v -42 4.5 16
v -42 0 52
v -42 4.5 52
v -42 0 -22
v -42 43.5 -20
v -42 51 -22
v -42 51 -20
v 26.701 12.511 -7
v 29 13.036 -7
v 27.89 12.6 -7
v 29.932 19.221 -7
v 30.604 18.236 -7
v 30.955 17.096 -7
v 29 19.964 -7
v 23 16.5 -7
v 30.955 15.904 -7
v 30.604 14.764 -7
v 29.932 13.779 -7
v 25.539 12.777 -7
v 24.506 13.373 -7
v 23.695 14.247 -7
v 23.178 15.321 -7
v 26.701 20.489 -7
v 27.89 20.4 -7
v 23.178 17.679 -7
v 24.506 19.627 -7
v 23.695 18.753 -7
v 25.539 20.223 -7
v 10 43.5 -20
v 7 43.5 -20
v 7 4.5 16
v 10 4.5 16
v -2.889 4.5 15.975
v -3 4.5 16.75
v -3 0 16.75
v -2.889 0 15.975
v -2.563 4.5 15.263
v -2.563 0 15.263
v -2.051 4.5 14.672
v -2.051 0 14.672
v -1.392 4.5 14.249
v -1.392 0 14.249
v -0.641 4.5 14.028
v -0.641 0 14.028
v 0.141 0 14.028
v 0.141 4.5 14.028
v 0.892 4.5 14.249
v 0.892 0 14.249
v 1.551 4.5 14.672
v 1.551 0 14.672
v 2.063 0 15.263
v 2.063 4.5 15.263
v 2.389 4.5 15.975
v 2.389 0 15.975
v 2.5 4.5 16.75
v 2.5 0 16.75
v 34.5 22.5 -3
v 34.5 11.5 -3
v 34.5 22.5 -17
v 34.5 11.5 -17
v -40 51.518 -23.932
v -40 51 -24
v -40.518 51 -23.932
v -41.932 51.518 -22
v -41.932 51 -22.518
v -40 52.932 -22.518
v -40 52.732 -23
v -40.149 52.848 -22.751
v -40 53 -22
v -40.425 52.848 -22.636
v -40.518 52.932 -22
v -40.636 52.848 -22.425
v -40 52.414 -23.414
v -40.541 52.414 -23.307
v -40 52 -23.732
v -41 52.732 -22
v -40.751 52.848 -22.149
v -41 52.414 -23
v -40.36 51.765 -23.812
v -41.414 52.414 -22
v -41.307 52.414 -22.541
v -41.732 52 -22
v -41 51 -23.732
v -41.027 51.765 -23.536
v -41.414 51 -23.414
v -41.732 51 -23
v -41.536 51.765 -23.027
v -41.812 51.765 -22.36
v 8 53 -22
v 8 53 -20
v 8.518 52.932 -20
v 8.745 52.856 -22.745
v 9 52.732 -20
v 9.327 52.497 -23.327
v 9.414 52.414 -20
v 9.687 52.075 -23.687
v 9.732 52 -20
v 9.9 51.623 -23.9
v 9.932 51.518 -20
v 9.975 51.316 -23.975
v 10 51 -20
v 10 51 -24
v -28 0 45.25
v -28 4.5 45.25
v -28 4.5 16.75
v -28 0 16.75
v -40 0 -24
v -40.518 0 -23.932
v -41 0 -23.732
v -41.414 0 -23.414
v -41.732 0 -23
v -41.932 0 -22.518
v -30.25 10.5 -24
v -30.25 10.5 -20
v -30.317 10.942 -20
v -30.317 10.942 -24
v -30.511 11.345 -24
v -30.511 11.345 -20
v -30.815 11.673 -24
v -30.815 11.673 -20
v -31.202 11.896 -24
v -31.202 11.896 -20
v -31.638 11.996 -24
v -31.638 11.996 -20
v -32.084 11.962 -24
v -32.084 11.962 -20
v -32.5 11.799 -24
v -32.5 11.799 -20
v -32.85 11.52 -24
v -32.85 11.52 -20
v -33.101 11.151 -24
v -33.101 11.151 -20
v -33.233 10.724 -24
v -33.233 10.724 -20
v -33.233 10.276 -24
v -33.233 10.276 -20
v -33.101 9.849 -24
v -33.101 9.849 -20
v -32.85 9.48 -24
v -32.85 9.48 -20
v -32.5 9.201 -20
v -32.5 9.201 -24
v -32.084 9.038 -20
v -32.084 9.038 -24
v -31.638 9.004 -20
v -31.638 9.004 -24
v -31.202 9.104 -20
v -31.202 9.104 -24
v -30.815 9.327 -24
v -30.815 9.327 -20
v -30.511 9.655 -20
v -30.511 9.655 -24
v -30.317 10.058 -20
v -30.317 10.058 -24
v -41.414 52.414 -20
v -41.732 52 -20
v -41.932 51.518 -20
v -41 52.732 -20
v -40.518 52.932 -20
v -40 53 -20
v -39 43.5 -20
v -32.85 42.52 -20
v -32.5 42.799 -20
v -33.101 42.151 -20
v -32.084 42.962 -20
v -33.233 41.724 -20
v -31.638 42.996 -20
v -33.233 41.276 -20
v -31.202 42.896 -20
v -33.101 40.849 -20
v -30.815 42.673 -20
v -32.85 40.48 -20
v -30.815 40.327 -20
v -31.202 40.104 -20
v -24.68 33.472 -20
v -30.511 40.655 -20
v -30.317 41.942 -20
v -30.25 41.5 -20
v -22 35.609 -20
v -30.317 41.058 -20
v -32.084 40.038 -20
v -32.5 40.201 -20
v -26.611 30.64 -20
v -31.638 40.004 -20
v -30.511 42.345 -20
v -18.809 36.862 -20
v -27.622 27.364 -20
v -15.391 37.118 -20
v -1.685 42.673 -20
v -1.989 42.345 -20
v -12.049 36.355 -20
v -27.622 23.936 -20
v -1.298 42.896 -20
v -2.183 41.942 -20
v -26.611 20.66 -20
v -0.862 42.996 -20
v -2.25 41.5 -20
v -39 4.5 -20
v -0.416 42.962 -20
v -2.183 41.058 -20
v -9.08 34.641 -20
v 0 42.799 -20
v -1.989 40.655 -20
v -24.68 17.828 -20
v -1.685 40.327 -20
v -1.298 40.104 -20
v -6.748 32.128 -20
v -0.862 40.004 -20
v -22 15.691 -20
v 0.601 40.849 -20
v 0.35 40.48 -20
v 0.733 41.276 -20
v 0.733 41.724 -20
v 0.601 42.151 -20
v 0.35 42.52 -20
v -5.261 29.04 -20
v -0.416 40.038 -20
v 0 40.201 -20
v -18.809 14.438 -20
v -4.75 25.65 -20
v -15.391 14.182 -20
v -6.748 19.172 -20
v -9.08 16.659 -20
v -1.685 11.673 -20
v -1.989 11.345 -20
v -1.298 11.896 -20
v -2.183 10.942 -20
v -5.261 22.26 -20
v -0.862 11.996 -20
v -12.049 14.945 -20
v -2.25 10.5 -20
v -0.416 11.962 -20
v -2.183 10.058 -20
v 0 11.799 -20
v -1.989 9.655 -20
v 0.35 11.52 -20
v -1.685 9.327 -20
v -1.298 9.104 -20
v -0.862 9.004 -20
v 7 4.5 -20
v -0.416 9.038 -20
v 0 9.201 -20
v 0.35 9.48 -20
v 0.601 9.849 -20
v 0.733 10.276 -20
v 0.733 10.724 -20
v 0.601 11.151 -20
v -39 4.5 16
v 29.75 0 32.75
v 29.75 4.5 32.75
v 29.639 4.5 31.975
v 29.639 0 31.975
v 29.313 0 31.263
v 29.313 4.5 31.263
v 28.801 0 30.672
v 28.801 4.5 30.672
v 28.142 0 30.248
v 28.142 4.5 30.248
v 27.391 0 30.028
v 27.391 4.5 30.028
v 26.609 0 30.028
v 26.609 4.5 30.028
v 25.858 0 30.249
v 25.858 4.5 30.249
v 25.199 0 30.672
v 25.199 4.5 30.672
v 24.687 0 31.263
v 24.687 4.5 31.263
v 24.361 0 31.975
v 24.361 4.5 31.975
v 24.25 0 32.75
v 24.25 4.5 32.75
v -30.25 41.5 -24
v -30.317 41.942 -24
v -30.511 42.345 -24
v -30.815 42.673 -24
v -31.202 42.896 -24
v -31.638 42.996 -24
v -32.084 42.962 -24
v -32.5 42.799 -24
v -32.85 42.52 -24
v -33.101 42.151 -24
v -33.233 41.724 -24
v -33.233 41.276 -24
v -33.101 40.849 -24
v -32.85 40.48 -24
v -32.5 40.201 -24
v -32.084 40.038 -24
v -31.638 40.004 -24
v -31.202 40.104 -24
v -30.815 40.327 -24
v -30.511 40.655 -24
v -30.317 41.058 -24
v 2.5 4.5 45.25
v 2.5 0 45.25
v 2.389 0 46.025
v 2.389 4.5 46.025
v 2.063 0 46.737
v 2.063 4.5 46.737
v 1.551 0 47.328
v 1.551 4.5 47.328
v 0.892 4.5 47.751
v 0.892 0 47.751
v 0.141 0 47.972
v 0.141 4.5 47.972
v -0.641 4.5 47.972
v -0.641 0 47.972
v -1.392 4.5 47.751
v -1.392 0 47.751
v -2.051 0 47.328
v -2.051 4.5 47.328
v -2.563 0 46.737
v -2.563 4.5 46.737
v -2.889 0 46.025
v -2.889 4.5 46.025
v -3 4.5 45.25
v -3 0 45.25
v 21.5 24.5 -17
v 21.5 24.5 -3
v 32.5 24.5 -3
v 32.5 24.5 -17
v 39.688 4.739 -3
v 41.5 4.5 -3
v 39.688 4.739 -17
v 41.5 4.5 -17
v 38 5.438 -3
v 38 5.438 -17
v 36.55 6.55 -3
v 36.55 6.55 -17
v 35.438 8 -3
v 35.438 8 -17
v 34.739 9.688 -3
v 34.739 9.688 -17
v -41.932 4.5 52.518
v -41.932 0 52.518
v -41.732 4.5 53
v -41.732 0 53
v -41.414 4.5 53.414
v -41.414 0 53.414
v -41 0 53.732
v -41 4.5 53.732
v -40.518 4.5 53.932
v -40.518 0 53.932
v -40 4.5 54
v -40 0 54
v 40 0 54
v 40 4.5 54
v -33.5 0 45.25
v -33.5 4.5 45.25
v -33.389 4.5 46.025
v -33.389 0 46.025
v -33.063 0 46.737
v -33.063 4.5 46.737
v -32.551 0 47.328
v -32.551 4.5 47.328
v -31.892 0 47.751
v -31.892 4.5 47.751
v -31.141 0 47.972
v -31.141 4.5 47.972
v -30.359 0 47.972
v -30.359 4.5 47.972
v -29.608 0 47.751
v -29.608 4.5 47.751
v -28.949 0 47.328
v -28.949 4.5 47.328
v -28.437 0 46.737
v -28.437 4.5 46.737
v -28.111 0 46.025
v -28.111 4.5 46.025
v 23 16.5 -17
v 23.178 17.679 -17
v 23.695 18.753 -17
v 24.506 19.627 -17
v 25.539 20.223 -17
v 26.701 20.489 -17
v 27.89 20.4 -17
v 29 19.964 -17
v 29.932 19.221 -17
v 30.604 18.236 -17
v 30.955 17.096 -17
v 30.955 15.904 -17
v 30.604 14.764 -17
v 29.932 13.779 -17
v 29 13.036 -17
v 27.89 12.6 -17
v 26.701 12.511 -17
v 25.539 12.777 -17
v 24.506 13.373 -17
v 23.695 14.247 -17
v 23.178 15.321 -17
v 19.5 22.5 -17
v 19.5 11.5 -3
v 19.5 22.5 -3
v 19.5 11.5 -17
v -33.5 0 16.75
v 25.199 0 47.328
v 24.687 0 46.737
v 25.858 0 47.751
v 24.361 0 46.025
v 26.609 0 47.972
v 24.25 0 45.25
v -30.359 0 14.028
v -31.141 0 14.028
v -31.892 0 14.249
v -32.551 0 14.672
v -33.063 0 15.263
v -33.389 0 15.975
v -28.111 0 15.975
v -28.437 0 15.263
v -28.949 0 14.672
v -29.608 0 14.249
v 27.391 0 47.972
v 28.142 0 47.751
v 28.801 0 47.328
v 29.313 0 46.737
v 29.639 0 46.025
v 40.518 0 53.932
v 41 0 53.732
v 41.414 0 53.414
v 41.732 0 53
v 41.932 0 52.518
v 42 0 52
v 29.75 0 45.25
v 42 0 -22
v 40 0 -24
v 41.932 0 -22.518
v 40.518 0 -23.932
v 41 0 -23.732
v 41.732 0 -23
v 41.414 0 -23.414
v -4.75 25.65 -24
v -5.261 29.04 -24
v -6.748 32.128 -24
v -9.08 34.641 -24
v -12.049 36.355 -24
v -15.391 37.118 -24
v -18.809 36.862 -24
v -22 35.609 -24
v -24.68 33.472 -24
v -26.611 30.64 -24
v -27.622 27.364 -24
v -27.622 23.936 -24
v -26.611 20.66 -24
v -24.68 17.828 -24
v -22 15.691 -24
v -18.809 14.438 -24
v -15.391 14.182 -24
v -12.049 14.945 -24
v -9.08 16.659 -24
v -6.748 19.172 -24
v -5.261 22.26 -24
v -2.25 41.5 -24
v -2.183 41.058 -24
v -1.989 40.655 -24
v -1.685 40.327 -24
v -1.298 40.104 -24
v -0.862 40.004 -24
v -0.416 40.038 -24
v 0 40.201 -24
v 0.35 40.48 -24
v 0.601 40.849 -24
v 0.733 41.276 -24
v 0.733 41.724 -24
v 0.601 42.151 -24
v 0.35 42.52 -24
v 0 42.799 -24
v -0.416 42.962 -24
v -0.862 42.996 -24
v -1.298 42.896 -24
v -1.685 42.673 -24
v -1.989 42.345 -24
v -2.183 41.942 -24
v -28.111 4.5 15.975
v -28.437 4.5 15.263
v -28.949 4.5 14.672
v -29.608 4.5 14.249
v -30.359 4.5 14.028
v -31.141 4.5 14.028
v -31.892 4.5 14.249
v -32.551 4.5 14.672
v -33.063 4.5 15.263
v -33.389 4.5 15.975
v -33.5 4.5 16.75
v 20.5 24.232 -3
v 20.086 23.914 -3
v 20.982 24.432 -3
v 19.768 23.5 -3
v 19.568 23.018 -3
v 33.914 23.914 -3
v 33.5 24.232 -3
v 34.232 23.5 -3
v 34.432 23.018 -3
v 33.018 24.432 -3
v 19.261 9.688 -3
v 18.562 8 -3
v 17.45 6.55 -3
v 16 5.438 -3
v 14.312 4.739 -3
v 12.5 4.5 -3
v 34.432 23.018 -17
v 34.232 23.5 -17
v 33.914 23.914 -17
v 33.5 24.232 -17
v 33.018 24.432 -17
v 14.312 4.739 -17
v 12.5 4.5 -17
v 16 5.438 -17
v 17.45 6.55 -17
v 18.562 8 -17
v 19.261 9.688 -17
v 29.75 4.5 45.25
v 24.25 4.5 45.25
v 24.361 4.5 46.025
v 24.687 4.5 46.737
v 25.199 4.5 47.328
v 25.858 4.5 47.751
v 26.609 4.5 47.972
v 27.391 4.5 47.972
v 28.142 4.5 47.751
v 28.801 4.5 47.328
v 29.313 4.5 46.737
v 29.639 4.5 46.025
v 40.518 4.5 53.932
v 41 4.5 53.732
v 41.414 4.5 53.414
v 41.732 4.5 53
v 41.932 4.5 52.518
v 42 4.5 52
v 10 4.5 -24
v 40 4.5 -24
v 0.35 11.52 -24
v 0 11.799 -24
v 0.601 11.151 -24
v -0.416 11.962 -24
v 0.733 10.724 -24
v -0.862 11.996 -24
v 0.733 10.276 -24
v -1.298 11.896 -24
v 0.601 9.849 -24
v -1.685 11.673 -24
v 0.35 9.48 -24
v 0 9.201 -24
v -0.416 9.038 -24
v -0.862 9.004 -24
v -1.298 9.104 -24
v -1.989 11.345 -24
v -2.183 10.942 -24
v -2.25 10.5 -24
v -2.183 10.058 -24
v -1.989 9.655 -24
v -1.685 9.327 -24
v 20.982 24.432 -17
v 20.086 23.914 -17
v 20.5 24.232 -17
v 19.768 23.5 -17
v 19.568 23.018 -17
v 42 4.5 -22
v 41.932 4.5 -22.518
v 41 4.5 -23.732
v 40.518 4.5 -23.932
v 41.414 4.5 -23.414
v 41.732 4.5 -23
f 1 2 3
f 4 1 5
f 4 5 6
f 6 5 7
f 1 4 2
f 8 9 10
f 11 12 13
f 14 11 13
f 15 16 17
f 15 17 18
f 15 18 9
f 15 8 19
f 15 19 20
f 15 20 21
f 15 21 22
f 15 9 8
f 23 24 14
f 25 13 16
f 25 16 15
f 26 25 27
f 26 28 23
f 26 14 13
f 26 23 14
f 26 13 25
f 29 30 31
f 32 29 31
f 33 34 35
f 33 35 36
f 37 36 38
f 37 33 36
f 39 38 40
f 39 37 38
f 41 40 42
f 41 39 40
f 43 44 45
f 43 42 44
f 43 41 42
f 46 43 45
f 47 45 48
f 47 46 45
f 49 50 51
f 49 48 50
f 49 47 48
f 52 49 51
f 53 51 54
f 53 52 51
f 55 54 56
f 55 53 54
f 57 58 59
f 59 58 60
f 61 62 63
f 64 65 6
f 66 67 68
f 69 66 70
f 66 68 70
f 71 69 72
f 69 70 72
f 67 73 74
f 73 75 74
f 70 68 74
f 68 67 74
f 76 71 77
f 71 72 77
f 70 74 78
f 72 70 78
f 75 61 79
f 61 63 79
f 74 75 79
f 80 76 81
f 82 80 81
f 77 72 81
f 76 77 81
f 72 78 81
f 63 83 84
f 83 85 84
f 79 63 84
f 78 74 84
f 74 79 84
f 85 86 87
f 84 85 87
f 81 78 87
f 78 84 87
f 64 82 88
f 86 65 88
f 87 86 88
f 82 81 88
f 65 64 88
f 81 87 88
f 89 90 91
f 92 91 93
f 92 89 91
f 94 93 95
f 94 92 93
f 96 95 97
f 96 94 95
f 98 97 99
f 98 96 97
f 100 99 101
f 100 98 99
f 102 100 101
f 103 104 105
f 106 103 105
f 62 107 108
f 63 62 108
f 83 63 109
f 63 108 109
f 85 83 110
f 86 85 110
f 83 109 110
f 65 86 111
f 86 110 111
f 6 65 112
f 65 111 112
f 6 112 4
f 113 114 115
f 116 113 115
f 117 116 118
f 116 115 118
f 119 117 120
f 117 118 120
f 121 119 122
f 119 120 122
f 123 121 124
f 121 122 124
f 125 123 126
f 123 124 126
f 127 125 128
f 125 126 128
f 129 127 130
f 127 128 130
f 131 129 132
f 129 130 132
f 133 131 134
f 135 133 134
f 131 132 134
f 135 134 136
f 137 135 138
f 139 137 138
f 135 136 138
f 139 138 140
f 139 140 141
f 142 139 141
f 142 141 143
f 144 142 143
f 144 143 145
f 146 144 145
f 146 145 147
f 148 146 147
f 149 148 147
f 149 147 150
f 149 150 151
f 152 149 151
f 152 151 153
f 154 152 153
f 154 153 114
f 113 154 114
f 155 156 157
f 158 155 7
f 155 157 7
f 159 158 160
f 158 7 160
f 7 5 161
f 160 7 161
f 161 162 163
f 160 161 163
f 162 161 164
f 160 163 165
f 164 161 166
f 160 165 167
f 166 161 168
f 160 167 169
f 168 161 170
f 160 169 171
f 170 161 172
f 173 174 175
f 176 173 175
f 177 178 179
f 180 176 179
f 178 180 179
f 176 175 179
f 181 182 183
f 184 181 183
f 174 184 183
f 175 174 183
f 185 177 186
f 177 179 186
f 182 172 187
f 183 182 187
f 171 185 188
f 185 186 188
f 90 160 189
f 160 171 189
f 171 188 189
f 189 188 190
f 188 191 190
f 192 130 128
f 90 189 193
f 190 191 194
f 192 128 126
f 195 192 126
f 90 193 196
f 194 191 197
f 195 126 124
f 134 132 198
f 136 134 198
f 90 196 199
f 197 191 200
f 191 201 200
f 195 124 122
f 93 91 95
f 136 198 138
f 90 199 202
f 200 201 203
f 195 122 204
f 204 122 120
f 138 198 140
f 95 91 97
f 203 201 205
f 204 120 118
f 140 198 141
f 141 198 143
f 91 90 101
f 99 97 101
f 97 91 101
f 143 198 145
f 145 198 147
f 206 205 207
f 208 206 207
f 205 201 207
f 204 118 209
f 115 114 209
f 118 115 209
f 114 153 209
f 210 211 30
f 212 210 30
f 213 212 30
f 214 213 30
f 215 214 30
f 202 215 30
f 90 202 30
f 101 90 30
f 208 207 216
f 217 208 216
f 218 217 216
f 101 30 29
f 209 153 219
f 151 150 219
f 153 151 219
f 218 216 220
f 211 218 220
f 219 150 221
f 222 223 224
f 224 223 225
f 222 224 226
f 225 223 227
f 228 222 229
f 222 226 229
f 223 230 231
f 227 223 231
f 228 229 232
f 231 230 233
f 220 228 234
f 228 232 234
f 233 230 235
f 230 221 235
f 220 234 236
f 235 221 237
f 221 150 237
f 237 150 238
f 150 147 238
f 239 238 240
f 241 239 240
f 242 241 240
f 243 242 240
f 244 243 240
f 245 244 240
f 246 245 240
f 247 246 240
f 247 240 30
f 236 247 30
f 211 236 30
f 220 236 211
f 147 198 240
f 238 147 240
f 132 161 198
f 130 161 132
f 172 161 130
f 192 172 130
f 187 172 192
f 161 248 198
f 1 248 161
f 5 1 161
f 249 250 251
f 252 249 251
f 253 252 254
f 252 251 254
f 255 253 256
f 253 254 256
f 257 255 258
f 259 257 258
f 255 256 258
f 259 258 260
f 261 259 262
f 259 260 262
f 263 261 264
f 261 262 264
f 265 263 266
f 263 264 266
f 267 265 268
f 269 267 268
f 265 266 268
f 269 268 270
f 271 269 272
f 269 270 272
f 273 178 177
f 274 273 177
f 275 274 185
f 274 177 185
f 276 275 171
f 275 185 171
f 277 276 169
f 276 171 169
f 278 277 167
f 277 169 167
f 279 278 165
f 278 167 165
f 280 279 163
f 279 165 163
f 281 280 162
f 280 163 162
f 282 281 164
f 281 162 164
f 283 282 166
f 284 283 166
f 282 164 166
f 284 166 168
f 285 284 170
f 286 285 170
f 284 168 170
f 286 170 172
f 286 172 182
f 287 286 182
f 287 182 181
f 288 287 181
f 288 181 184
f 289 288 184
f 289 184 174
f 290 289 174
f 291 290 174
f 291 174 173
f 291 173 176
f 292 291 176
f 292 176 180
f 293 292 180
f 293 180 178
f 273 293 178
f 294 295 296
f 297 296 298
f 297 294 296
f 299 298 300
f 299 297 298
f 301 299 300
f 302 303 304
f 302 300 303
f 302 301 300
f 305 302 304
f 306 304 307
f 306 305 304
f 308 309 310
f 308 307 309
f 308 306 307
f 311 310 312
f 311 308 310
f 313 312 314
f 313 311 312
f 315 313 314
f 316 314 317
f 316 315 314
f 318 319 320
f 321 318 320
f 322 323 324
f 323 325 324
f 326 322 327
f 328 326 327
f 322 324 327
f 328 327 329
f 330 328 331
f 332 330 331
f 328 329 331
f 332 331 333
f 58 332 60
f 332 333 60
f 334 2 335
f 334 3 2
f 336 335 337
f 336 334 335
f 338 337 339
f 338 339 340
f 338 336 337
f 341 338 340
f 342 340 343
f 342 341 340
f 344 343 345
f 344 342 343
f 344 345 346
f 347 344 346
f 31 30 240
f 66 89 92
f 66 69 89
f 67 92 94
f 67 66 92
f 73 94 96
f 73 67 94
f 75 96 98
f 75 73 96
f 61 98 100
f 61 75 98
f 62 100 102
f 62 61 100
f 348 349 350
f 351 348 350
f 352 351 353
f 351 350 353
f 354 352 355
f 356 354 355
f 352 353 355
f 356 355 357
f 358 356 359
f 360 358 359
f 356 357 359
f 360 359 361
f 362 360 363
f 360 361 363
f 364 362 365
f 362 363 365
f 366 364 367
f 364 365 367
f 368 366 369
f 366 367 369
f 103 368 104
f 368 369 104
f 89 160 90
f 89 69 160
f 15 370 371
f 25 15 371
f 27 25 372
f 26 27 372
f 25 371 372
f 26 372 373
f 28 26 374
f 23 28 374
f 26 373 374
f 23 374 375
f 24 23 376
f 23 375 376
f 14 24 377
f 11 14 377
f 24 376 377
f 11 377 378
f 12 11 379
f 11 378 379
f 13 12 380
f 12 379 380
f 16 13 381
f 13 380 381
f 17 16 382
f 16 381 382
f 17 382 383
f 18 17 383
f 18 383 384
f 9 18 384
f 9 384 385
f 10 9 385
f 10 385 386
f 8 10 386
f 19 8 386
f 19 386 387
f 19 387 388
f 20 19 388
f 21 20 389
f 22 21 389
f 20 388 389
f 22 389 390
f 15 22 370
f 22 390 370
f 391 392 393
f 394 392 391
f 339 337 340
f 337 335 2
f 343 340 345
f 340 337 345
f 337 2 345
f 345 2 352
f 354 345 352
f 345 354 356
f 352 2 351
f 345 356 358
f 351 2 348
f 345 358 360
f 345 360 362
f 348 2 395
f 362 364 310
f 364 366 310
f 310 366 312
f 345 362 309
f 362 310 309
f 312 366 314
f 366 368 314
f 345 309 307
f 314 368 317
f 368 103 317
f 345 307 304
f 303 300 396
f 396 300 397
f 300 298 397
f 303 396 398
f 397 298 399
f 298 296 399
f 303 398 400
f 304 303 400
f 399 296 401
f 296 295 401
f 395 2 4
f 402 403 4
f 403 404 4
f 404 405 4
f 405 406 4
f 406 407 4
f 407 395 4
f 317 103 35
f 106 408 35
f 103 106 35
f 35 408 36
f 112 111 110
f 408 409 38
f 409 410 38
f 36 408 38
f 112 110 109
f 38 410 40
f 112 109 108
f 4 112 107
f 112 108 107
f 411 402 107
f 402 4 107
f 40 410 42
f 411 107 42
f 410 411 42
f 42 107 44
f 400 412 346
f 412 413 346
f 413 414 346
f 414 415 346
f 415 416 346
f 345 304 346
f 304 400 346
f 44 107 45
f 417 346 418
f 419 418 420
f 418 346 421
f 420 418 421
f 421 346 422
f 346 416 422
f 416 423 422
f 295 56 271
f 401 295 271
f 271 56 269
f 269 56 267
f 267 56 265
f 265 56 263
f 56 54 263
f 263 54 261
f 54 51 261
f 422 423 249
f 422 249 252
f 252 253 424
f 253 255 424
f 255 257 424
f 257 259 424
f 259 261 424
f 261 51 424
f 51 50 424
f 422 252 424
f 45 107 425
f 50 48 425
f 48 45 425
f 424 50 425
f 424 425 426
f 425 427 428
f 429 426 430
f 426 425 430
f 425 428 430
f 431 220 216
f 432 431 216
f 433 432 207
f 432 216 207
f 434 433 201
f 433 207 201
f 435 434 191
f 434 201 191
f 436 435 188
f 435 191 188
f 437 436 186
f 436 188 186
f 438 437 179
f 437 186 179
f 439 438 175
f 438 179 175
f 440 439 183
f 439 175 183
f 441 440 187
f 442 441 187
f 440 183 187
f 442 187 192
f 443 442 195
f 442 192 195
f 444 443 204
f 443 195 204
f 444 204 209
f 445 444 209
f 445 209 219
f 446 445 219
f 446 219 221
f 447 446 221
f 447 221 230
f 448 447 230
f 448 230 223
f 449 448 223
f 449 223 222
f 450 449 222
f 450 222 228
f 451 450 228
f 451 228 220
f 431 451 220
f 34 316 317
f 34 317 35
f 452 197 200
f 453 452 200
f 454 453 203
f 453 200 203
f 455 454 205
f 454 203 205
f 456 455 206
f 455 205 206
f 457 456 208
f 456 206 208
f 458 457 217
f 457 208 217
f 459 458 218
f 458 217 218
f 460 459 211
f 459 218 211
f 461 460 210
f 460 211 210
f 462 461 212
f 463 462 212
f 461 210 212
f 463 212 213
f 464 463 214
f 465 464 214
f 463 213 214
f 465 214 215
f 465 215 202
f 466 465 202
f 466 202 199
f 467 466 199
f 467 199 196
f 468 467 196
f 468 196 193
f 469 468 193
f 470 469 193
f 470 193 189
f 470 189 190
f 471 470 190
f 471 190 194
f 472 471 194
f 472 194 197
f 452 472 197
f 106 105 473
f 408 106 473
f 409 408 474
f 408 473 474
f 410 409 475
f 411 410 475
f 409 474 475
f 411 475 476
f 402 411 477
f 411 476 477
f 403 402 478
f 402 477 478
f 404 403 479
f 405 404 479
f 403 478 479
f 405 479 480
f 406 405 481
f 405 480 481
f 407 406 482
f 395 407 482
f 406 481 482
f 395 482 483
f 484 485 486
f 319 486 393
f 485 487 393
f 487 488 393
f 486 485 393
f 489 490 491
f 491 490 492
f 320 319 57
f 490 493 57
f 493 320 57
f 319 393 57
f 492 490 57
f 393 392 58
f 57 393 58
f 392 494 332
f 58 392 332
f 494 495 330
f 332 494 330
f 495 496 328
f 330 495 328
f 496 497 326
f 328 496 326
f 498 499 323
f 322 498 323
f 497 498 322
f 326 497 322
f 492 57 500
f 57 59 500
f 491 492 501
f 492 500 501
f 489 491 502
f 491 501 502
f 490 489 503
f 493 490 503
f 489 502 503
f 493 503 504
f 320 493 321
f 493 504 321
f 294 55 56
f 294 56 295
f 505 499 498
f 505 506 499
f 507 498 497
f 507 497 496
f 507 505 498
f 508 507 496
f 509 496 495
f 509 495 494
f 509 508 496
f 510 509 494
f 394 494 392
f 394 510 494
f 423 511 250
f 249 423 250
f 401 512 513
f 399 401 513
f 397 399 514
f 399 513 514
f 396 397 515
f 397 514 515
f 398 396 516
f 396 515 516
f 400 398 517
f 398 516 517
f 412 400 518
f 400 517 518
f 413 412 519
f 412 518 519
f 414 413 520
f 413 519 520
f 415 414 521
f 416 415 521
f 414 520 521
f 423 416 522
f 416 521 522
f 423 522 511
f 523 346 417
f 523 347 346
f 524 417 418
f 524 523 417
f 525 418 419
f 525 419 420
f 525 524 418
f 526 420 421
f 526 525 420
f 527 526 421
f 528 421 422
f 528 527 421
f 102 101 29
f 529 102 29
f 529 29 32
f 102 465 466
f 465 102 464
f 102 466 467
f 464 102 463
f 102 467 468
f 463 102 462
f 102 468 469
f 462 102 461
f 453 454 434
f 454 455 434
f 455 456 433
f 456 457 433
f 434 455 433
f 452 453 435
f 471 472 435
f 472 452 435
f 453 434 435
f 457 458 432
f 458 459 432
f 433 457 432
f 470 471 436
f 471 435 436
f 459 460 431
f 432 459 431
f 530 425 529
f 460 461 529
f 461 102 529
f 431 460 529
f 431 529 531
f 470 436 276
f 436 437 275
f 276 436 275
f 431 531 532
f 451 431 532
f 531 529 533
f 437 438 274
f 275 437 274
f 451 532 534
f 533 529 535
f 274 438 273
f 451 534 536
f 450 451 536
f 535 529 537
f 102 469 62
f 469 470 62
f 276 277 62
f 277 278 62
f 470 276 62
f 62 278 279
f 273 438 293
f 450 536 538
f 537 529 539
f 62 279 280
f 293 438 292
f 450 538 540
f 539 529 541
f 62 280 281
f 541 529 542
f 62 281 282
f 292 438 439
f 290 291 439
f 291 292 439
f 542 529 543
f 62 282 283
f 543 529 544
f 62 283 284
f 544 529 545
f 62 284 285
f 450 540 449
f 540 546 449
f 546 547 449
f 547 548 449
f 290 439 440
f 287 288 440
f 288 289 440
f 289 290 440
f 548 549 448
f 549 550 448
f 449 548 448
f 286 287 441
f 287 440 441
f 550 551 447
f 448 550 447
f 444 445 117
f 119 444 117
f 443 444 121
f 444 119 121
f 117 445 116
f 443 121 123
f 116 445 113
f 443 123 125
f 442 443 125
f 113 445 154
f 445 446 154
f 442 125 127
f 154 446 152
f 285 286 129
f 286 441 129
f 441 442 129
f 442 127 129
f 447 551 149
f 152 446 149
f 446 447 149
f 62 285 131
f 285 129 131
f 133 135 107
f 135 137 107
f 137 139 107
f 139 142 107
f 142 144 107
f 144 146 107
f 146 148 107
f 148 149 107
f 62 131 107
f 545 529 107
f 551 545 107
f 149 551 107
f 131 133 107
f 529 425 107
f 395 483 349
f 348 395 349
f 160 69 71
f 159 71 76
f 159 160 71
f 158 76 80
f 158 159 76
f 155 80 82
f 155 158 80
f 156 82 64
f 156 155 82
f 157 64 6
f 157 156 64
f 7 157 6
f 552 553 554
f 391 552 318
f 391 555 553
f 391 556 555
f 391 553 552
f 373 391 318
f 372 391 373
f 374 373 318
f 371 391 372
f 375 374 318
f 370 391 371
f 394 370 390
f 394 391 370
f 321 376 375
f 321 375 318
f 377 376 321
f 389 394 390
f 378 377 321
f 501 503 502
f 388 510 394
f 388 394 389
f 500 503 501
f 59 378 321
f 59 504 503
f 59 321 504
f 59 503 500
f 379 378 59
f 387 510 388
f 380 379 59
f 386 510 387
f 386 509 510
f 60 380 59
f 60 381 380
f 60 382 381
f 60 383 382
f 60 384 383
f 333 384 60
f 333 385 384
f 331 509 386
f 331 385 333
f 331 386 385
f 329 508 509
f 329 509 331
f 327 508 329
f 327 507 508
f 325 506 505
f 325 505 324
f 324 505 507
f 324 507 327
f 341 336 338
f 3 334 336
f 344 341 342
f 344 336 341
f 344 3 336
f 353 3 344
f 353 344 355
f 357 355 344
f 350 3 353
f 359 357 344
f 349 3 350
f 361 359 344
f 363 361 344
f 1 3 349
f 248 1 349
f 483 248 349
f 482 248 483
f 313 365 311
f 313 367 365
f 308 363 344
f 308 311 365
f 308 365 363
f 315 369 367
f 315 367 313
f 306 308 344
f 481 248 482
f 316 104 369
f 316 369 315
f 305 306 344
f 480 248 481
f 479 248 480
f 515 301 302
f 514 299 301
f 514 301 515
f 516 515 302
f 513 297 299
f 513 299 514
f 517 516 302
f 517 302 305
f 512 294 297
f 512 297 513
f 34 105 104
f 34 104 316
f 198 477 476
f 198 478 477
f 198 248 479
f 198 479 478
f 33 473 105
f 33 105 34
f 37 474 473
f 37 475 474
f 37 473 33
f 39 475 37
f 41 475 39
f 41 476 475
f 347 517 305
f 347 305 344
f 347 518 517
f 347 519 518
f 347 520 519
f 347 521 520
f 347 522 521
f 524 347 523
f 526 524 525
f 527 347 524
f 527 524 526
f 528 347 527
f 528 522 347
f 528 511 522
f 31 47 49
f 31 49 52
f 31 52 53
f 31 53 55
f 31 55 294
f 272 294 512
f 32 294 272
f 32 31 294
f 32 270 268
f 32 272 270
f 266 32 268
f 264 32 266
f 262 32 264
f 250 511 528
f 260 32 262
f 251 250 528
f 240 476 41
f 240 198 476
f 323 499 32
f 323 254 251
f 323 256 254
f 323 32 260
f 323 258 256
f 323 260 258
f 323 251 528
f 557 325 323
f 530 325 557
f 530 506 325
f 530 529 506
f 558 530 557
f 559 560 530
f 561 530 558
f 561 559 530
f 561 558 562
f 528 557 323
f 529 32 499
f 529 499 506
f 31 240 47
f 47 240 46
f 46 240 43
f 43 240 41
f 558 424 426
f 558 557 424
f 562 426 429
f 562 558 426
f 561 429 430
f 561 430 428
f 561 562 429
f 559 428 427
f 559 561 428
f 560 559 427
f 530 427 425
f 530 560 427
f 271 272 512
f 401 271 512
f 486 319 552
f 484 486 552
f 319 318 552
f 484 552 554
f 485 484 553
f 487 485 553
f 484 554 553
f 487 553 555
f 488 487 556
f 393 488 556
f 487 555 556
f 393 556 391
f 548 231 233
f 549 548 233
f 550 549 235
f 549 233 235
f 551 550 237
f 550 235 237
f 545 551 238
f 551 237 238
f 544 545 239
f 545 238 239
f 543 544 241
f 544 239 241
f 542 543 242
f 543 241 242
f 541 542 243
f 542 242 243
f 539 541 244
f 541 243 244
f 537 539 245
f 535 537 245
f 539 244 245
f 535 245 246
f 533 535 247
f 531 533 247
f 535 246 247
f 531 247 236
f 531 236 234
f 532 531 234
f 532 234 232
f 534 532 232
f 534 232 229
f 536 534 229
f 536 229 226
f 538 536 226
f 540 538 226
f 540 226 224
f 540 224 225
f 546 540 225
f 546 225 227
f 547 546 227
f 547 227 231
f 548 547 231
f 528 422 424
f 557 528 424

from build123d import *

# Parameters (mm, degrees)
SKETCH1_W               = 84
SKETCH1_H               = 78
BOSS_EXTRUDE1_DEPTH     = 4.5
FILLET2_R               = 2
CUT_EXTRUDE1_DEPTH      = 69.558369292
CUT_EXTRUDE1_DEPTH_BACK = 69.558369292
BOSS_EXTRUDE2_DEPTH     = 48.5
FILLET4_R               = 2
RIB7_REACH              = 115.053
SKETCH4_WALL_W          = 281.181587792
SKETCH4_WALL_H          = 3
RIB8_REACH              = 93.81
SKETCH6_WALL_W          = 238.694589152
SKETCH6_WALL_H          = 3
SKETCH7_R               = 11.5
SKETCH7_R_2             = 1.5
CUT_EXTRUDE2_DEPTH      = 101.244700608
SKETCH8_W               = 15
SKETCH8_H               = 14
BOSS_EXTRUDE3_DEPTH     = 20
FILLET5_R               = 7
FILLET6_R               = 2
SKETCH9_R               = 4
CUT_EXTRUDE3_DEPTH      = 10
CUT_EXTRUDE4_DEPTH      = 84.858511792


with BuildPart() as part:
    # Sketch1 → Boss-Extrude1 (new body)
    with BuildSketch(Plane(origin=(0, 0, 0), x_dir=(1, 0, 0), z_dir=(0, 1, 0))):
        with Locations((0, -15)):
            Rectangle(SKETCH1_W, SKETCH1_H)
    extrude(amount=BOSS_EXTRUDE1_DEPTH)

    # Fillet2
    fillet2_edges = [part.edges().sort_by_distance(p)[0] for p in [
        (-42, 2.25, -24),
        (42, 2.25, -24),
        (42, 2.25, 54),
        (-42, 2.25, 54),
    ]]
    fillet(fillet2_edges, radius=FILLET2_R)

    # Sketch2 → Cut-Extrude1 (cut, two sides)
    with BuildSketch(Plane(origin=(0, 4.5, 0), x_dir=(1, 0, 0), z_dir=(0, 1, 0))) as cut_extrude1_sk:
        with BuildLine():
            Line((-33.5, -16.749999598), (-33.5, -45.249999598))
            ThreePointArc((-33.5, -45.249999598), (-30.750000201, -48), (-28, -45.25))
            Line((-28, -45.25), (-28, -16.749999598))
            ThreePointArc((-28, -16.749999598), (-30.75, -13.999999598), (-33.5, -16.749999598))
        make_face()
        with BuildLine():
            Line((2.5, -16.749999598), (2.5, -45.249999598))
            ThreePointArc((2.5, -45.249999598), (-0.249999799, -48), (-3, -45.25))
            Line((-3, -45.25), (-3, -16.749999598))
            ThreePointArc((-3, -16.749999598), (-0.25, -13.999999598), (2.5, -16.749999598))
        make_face()
    extrude(amount=CUT_EXTRUDE1_DEPTH, mode=Mode.SUBTRACT)
    extrude(cut_extrude1_sk.sketch, amount=-CUT_EXTRUDE1_DEPTH_BACK, mode=Mode.SUBTRACT)

    # Sketch3 → Boss-Extrude2 (add)
    with BuildSketch(Plane(origin=(0, 4.5, 0), x_dir=(1, 0, 0), z_dir=(0, 1, 0))):
        with BuildLine():
            Line((-42, 20), (10, 20))
            Line((10, 20), (10, 24))
            Line((10, 24), (-40, 24))
            ThreePointArc((-40, 24), (-41.414213562, 23.414213562), (-42, 22))
            Line((-42, 22), (-42, 20))
        make_face()
    extrude(amount=BOSS_EXTRUDE2_DEPTH)

    # Fillet4
    fillet4_edges = [part.edges().sort_by_distance(p)[0] for p in [
        (-42, 53, -21),
        (10, 53, -22),
        (-15, 53, -24),
        (-41.414213562, 53, -23.414213562),
    ]]
    fillet(fillet4_edges, radius=FILLET4_R)

    # Sketch4 wall → Rib7 (add, up to next)
    with BuildSketch(Plane(origin=(-42, 24, -2), x_dir=(0, 0.734803444627, -0.678280102733), z_dir=(0, -0.678280102733, -0.734803444627)), mode=Mode.PRIVATE) as rib7_sk1:
        with Locations((0, 1.5)):
            Rectangle(SKETCH4_WALL_W, SKETCH4_WALL_H)
    rib7_tool1 = extrude(rib7_sk1.sketch, amount=RIB7_REACH, mode=Mode.PRIVATE) - part.part
    add(rib7_tool1.solids().sort_by_distance((-42, 24, -2))[0])

    # Sketch6 wall → Rib8 (add, up to next)
    with BuildSketch(Plane(origin=(10, 24, -2), x_dir=(0, -0.734803444627, 0.678280102733), z_dir=(0, -0.678280102733, -0.734803444627)), mode=Mode.PRIVATE) as rib8_sk1:
        with Locations((0, 1.5)):
            Rectangle(SKETCH6_WALL_W, SKETCH6_WALL_H)
    rib8_tool1 = extrude(rib8_sk1.sketch, amount=RIB8_REACH, mode=Mode.PRIVATE) - part.part
    add(rib8_tool1.solids().sort_by_distance((10, 24, -2))[0])

    # Sketch7 → Cut-Extrude2 (cut, through all)
    with BuildSketch(Plane.XY.offset(-20)):
        with Locations((-16.25, 25.65)):
            Circle(SKETCH7_R)
        with Locations((-31.75, 41.5)):
            Circle(SKETCH7_R_2)
        with Locations((-31.75, 10.5)):
            Circle(SKETCH7_R_2)
        with Locations(Location((-0.75, 10.5, 0), (0, 0, 180))):
            Circle(SKETCH7_R_2)
        with Locations(Location((-0.75, 41.5, 0), (0, 0, 180))):
            Circle(SKETCH7_R_2)
    extrude(amount=-CUT_EXTRUDE2_DEPTH, mode=Mode.SUBTRACT)

    # Sketch8 → Boss-Extrude3 (add)
    with BuildSketch(Plane(origin=(0, 4.5, 0), x_dir=(1, 0, 0), z_dir=(0, 1, 0))):
        with Locations((27, 10)):
            Rectangle(SKETCH8_W, SKETCH8_H)
    extrude(amount=BOSS_EXTRUDE3_DEPTH)

    # Fillet5
    fillet5_edges = [part.edges().sort_by_distance(p)[0] for p in [
        (19.5, 4.5, -10),
        (34.5, 4.5, -10),
    ]]
    fillet(fillet5_edges, radius=FILLET5_R)

    # Fillet6
    fillet6_edges = [part.edges().sort_by_distance(p)[0] for p in [
        (19.5, 24.5, -10),
        (34.5, 24.5, -10),
    ]]
    fillet(fillet6_edges, radius=FILLET6_R)

    # Sketch9 → Cut-Extrude3 (cut)
    with BuildSketch(Plane(origin=(0, 0, -17), x_dir=(-1, 0, 0), z_dir=(0, 0, -1))):
        with Locations((-27, 16.5)):
            Circle(SKETCH9_R)
    extrude(amount=-CUT_EXTRUDE3_DEPTH, mode=Mode.SUBTRACT)

    # Sketch10 → Cut-Extrude4 (cut, through all)
    with BuildSketch(Plane(origin=(0, 4.5, 0), x_dir=(1, 0, 0), z_dir=(0, 1, 0))):
        with BuildLine():
            Line((24.25, -32.75), (24.25, -45.25))
            ThreePointArc((24.25, -45.25), (26.999999703, -48), (29.75, -45.250000593))
            Line((29.75, -45.250000593), (29.75, -32.749975496))
            ThreePointArc((29.75, -32.749975496), (26.999987748, -29.999987748), (24.25, -32.75))
        make_face()
    extrude(amount=-CUT_EXTRUDE4_DEPTH, mode=Mode.SUBTRACT)


solid = part.part
